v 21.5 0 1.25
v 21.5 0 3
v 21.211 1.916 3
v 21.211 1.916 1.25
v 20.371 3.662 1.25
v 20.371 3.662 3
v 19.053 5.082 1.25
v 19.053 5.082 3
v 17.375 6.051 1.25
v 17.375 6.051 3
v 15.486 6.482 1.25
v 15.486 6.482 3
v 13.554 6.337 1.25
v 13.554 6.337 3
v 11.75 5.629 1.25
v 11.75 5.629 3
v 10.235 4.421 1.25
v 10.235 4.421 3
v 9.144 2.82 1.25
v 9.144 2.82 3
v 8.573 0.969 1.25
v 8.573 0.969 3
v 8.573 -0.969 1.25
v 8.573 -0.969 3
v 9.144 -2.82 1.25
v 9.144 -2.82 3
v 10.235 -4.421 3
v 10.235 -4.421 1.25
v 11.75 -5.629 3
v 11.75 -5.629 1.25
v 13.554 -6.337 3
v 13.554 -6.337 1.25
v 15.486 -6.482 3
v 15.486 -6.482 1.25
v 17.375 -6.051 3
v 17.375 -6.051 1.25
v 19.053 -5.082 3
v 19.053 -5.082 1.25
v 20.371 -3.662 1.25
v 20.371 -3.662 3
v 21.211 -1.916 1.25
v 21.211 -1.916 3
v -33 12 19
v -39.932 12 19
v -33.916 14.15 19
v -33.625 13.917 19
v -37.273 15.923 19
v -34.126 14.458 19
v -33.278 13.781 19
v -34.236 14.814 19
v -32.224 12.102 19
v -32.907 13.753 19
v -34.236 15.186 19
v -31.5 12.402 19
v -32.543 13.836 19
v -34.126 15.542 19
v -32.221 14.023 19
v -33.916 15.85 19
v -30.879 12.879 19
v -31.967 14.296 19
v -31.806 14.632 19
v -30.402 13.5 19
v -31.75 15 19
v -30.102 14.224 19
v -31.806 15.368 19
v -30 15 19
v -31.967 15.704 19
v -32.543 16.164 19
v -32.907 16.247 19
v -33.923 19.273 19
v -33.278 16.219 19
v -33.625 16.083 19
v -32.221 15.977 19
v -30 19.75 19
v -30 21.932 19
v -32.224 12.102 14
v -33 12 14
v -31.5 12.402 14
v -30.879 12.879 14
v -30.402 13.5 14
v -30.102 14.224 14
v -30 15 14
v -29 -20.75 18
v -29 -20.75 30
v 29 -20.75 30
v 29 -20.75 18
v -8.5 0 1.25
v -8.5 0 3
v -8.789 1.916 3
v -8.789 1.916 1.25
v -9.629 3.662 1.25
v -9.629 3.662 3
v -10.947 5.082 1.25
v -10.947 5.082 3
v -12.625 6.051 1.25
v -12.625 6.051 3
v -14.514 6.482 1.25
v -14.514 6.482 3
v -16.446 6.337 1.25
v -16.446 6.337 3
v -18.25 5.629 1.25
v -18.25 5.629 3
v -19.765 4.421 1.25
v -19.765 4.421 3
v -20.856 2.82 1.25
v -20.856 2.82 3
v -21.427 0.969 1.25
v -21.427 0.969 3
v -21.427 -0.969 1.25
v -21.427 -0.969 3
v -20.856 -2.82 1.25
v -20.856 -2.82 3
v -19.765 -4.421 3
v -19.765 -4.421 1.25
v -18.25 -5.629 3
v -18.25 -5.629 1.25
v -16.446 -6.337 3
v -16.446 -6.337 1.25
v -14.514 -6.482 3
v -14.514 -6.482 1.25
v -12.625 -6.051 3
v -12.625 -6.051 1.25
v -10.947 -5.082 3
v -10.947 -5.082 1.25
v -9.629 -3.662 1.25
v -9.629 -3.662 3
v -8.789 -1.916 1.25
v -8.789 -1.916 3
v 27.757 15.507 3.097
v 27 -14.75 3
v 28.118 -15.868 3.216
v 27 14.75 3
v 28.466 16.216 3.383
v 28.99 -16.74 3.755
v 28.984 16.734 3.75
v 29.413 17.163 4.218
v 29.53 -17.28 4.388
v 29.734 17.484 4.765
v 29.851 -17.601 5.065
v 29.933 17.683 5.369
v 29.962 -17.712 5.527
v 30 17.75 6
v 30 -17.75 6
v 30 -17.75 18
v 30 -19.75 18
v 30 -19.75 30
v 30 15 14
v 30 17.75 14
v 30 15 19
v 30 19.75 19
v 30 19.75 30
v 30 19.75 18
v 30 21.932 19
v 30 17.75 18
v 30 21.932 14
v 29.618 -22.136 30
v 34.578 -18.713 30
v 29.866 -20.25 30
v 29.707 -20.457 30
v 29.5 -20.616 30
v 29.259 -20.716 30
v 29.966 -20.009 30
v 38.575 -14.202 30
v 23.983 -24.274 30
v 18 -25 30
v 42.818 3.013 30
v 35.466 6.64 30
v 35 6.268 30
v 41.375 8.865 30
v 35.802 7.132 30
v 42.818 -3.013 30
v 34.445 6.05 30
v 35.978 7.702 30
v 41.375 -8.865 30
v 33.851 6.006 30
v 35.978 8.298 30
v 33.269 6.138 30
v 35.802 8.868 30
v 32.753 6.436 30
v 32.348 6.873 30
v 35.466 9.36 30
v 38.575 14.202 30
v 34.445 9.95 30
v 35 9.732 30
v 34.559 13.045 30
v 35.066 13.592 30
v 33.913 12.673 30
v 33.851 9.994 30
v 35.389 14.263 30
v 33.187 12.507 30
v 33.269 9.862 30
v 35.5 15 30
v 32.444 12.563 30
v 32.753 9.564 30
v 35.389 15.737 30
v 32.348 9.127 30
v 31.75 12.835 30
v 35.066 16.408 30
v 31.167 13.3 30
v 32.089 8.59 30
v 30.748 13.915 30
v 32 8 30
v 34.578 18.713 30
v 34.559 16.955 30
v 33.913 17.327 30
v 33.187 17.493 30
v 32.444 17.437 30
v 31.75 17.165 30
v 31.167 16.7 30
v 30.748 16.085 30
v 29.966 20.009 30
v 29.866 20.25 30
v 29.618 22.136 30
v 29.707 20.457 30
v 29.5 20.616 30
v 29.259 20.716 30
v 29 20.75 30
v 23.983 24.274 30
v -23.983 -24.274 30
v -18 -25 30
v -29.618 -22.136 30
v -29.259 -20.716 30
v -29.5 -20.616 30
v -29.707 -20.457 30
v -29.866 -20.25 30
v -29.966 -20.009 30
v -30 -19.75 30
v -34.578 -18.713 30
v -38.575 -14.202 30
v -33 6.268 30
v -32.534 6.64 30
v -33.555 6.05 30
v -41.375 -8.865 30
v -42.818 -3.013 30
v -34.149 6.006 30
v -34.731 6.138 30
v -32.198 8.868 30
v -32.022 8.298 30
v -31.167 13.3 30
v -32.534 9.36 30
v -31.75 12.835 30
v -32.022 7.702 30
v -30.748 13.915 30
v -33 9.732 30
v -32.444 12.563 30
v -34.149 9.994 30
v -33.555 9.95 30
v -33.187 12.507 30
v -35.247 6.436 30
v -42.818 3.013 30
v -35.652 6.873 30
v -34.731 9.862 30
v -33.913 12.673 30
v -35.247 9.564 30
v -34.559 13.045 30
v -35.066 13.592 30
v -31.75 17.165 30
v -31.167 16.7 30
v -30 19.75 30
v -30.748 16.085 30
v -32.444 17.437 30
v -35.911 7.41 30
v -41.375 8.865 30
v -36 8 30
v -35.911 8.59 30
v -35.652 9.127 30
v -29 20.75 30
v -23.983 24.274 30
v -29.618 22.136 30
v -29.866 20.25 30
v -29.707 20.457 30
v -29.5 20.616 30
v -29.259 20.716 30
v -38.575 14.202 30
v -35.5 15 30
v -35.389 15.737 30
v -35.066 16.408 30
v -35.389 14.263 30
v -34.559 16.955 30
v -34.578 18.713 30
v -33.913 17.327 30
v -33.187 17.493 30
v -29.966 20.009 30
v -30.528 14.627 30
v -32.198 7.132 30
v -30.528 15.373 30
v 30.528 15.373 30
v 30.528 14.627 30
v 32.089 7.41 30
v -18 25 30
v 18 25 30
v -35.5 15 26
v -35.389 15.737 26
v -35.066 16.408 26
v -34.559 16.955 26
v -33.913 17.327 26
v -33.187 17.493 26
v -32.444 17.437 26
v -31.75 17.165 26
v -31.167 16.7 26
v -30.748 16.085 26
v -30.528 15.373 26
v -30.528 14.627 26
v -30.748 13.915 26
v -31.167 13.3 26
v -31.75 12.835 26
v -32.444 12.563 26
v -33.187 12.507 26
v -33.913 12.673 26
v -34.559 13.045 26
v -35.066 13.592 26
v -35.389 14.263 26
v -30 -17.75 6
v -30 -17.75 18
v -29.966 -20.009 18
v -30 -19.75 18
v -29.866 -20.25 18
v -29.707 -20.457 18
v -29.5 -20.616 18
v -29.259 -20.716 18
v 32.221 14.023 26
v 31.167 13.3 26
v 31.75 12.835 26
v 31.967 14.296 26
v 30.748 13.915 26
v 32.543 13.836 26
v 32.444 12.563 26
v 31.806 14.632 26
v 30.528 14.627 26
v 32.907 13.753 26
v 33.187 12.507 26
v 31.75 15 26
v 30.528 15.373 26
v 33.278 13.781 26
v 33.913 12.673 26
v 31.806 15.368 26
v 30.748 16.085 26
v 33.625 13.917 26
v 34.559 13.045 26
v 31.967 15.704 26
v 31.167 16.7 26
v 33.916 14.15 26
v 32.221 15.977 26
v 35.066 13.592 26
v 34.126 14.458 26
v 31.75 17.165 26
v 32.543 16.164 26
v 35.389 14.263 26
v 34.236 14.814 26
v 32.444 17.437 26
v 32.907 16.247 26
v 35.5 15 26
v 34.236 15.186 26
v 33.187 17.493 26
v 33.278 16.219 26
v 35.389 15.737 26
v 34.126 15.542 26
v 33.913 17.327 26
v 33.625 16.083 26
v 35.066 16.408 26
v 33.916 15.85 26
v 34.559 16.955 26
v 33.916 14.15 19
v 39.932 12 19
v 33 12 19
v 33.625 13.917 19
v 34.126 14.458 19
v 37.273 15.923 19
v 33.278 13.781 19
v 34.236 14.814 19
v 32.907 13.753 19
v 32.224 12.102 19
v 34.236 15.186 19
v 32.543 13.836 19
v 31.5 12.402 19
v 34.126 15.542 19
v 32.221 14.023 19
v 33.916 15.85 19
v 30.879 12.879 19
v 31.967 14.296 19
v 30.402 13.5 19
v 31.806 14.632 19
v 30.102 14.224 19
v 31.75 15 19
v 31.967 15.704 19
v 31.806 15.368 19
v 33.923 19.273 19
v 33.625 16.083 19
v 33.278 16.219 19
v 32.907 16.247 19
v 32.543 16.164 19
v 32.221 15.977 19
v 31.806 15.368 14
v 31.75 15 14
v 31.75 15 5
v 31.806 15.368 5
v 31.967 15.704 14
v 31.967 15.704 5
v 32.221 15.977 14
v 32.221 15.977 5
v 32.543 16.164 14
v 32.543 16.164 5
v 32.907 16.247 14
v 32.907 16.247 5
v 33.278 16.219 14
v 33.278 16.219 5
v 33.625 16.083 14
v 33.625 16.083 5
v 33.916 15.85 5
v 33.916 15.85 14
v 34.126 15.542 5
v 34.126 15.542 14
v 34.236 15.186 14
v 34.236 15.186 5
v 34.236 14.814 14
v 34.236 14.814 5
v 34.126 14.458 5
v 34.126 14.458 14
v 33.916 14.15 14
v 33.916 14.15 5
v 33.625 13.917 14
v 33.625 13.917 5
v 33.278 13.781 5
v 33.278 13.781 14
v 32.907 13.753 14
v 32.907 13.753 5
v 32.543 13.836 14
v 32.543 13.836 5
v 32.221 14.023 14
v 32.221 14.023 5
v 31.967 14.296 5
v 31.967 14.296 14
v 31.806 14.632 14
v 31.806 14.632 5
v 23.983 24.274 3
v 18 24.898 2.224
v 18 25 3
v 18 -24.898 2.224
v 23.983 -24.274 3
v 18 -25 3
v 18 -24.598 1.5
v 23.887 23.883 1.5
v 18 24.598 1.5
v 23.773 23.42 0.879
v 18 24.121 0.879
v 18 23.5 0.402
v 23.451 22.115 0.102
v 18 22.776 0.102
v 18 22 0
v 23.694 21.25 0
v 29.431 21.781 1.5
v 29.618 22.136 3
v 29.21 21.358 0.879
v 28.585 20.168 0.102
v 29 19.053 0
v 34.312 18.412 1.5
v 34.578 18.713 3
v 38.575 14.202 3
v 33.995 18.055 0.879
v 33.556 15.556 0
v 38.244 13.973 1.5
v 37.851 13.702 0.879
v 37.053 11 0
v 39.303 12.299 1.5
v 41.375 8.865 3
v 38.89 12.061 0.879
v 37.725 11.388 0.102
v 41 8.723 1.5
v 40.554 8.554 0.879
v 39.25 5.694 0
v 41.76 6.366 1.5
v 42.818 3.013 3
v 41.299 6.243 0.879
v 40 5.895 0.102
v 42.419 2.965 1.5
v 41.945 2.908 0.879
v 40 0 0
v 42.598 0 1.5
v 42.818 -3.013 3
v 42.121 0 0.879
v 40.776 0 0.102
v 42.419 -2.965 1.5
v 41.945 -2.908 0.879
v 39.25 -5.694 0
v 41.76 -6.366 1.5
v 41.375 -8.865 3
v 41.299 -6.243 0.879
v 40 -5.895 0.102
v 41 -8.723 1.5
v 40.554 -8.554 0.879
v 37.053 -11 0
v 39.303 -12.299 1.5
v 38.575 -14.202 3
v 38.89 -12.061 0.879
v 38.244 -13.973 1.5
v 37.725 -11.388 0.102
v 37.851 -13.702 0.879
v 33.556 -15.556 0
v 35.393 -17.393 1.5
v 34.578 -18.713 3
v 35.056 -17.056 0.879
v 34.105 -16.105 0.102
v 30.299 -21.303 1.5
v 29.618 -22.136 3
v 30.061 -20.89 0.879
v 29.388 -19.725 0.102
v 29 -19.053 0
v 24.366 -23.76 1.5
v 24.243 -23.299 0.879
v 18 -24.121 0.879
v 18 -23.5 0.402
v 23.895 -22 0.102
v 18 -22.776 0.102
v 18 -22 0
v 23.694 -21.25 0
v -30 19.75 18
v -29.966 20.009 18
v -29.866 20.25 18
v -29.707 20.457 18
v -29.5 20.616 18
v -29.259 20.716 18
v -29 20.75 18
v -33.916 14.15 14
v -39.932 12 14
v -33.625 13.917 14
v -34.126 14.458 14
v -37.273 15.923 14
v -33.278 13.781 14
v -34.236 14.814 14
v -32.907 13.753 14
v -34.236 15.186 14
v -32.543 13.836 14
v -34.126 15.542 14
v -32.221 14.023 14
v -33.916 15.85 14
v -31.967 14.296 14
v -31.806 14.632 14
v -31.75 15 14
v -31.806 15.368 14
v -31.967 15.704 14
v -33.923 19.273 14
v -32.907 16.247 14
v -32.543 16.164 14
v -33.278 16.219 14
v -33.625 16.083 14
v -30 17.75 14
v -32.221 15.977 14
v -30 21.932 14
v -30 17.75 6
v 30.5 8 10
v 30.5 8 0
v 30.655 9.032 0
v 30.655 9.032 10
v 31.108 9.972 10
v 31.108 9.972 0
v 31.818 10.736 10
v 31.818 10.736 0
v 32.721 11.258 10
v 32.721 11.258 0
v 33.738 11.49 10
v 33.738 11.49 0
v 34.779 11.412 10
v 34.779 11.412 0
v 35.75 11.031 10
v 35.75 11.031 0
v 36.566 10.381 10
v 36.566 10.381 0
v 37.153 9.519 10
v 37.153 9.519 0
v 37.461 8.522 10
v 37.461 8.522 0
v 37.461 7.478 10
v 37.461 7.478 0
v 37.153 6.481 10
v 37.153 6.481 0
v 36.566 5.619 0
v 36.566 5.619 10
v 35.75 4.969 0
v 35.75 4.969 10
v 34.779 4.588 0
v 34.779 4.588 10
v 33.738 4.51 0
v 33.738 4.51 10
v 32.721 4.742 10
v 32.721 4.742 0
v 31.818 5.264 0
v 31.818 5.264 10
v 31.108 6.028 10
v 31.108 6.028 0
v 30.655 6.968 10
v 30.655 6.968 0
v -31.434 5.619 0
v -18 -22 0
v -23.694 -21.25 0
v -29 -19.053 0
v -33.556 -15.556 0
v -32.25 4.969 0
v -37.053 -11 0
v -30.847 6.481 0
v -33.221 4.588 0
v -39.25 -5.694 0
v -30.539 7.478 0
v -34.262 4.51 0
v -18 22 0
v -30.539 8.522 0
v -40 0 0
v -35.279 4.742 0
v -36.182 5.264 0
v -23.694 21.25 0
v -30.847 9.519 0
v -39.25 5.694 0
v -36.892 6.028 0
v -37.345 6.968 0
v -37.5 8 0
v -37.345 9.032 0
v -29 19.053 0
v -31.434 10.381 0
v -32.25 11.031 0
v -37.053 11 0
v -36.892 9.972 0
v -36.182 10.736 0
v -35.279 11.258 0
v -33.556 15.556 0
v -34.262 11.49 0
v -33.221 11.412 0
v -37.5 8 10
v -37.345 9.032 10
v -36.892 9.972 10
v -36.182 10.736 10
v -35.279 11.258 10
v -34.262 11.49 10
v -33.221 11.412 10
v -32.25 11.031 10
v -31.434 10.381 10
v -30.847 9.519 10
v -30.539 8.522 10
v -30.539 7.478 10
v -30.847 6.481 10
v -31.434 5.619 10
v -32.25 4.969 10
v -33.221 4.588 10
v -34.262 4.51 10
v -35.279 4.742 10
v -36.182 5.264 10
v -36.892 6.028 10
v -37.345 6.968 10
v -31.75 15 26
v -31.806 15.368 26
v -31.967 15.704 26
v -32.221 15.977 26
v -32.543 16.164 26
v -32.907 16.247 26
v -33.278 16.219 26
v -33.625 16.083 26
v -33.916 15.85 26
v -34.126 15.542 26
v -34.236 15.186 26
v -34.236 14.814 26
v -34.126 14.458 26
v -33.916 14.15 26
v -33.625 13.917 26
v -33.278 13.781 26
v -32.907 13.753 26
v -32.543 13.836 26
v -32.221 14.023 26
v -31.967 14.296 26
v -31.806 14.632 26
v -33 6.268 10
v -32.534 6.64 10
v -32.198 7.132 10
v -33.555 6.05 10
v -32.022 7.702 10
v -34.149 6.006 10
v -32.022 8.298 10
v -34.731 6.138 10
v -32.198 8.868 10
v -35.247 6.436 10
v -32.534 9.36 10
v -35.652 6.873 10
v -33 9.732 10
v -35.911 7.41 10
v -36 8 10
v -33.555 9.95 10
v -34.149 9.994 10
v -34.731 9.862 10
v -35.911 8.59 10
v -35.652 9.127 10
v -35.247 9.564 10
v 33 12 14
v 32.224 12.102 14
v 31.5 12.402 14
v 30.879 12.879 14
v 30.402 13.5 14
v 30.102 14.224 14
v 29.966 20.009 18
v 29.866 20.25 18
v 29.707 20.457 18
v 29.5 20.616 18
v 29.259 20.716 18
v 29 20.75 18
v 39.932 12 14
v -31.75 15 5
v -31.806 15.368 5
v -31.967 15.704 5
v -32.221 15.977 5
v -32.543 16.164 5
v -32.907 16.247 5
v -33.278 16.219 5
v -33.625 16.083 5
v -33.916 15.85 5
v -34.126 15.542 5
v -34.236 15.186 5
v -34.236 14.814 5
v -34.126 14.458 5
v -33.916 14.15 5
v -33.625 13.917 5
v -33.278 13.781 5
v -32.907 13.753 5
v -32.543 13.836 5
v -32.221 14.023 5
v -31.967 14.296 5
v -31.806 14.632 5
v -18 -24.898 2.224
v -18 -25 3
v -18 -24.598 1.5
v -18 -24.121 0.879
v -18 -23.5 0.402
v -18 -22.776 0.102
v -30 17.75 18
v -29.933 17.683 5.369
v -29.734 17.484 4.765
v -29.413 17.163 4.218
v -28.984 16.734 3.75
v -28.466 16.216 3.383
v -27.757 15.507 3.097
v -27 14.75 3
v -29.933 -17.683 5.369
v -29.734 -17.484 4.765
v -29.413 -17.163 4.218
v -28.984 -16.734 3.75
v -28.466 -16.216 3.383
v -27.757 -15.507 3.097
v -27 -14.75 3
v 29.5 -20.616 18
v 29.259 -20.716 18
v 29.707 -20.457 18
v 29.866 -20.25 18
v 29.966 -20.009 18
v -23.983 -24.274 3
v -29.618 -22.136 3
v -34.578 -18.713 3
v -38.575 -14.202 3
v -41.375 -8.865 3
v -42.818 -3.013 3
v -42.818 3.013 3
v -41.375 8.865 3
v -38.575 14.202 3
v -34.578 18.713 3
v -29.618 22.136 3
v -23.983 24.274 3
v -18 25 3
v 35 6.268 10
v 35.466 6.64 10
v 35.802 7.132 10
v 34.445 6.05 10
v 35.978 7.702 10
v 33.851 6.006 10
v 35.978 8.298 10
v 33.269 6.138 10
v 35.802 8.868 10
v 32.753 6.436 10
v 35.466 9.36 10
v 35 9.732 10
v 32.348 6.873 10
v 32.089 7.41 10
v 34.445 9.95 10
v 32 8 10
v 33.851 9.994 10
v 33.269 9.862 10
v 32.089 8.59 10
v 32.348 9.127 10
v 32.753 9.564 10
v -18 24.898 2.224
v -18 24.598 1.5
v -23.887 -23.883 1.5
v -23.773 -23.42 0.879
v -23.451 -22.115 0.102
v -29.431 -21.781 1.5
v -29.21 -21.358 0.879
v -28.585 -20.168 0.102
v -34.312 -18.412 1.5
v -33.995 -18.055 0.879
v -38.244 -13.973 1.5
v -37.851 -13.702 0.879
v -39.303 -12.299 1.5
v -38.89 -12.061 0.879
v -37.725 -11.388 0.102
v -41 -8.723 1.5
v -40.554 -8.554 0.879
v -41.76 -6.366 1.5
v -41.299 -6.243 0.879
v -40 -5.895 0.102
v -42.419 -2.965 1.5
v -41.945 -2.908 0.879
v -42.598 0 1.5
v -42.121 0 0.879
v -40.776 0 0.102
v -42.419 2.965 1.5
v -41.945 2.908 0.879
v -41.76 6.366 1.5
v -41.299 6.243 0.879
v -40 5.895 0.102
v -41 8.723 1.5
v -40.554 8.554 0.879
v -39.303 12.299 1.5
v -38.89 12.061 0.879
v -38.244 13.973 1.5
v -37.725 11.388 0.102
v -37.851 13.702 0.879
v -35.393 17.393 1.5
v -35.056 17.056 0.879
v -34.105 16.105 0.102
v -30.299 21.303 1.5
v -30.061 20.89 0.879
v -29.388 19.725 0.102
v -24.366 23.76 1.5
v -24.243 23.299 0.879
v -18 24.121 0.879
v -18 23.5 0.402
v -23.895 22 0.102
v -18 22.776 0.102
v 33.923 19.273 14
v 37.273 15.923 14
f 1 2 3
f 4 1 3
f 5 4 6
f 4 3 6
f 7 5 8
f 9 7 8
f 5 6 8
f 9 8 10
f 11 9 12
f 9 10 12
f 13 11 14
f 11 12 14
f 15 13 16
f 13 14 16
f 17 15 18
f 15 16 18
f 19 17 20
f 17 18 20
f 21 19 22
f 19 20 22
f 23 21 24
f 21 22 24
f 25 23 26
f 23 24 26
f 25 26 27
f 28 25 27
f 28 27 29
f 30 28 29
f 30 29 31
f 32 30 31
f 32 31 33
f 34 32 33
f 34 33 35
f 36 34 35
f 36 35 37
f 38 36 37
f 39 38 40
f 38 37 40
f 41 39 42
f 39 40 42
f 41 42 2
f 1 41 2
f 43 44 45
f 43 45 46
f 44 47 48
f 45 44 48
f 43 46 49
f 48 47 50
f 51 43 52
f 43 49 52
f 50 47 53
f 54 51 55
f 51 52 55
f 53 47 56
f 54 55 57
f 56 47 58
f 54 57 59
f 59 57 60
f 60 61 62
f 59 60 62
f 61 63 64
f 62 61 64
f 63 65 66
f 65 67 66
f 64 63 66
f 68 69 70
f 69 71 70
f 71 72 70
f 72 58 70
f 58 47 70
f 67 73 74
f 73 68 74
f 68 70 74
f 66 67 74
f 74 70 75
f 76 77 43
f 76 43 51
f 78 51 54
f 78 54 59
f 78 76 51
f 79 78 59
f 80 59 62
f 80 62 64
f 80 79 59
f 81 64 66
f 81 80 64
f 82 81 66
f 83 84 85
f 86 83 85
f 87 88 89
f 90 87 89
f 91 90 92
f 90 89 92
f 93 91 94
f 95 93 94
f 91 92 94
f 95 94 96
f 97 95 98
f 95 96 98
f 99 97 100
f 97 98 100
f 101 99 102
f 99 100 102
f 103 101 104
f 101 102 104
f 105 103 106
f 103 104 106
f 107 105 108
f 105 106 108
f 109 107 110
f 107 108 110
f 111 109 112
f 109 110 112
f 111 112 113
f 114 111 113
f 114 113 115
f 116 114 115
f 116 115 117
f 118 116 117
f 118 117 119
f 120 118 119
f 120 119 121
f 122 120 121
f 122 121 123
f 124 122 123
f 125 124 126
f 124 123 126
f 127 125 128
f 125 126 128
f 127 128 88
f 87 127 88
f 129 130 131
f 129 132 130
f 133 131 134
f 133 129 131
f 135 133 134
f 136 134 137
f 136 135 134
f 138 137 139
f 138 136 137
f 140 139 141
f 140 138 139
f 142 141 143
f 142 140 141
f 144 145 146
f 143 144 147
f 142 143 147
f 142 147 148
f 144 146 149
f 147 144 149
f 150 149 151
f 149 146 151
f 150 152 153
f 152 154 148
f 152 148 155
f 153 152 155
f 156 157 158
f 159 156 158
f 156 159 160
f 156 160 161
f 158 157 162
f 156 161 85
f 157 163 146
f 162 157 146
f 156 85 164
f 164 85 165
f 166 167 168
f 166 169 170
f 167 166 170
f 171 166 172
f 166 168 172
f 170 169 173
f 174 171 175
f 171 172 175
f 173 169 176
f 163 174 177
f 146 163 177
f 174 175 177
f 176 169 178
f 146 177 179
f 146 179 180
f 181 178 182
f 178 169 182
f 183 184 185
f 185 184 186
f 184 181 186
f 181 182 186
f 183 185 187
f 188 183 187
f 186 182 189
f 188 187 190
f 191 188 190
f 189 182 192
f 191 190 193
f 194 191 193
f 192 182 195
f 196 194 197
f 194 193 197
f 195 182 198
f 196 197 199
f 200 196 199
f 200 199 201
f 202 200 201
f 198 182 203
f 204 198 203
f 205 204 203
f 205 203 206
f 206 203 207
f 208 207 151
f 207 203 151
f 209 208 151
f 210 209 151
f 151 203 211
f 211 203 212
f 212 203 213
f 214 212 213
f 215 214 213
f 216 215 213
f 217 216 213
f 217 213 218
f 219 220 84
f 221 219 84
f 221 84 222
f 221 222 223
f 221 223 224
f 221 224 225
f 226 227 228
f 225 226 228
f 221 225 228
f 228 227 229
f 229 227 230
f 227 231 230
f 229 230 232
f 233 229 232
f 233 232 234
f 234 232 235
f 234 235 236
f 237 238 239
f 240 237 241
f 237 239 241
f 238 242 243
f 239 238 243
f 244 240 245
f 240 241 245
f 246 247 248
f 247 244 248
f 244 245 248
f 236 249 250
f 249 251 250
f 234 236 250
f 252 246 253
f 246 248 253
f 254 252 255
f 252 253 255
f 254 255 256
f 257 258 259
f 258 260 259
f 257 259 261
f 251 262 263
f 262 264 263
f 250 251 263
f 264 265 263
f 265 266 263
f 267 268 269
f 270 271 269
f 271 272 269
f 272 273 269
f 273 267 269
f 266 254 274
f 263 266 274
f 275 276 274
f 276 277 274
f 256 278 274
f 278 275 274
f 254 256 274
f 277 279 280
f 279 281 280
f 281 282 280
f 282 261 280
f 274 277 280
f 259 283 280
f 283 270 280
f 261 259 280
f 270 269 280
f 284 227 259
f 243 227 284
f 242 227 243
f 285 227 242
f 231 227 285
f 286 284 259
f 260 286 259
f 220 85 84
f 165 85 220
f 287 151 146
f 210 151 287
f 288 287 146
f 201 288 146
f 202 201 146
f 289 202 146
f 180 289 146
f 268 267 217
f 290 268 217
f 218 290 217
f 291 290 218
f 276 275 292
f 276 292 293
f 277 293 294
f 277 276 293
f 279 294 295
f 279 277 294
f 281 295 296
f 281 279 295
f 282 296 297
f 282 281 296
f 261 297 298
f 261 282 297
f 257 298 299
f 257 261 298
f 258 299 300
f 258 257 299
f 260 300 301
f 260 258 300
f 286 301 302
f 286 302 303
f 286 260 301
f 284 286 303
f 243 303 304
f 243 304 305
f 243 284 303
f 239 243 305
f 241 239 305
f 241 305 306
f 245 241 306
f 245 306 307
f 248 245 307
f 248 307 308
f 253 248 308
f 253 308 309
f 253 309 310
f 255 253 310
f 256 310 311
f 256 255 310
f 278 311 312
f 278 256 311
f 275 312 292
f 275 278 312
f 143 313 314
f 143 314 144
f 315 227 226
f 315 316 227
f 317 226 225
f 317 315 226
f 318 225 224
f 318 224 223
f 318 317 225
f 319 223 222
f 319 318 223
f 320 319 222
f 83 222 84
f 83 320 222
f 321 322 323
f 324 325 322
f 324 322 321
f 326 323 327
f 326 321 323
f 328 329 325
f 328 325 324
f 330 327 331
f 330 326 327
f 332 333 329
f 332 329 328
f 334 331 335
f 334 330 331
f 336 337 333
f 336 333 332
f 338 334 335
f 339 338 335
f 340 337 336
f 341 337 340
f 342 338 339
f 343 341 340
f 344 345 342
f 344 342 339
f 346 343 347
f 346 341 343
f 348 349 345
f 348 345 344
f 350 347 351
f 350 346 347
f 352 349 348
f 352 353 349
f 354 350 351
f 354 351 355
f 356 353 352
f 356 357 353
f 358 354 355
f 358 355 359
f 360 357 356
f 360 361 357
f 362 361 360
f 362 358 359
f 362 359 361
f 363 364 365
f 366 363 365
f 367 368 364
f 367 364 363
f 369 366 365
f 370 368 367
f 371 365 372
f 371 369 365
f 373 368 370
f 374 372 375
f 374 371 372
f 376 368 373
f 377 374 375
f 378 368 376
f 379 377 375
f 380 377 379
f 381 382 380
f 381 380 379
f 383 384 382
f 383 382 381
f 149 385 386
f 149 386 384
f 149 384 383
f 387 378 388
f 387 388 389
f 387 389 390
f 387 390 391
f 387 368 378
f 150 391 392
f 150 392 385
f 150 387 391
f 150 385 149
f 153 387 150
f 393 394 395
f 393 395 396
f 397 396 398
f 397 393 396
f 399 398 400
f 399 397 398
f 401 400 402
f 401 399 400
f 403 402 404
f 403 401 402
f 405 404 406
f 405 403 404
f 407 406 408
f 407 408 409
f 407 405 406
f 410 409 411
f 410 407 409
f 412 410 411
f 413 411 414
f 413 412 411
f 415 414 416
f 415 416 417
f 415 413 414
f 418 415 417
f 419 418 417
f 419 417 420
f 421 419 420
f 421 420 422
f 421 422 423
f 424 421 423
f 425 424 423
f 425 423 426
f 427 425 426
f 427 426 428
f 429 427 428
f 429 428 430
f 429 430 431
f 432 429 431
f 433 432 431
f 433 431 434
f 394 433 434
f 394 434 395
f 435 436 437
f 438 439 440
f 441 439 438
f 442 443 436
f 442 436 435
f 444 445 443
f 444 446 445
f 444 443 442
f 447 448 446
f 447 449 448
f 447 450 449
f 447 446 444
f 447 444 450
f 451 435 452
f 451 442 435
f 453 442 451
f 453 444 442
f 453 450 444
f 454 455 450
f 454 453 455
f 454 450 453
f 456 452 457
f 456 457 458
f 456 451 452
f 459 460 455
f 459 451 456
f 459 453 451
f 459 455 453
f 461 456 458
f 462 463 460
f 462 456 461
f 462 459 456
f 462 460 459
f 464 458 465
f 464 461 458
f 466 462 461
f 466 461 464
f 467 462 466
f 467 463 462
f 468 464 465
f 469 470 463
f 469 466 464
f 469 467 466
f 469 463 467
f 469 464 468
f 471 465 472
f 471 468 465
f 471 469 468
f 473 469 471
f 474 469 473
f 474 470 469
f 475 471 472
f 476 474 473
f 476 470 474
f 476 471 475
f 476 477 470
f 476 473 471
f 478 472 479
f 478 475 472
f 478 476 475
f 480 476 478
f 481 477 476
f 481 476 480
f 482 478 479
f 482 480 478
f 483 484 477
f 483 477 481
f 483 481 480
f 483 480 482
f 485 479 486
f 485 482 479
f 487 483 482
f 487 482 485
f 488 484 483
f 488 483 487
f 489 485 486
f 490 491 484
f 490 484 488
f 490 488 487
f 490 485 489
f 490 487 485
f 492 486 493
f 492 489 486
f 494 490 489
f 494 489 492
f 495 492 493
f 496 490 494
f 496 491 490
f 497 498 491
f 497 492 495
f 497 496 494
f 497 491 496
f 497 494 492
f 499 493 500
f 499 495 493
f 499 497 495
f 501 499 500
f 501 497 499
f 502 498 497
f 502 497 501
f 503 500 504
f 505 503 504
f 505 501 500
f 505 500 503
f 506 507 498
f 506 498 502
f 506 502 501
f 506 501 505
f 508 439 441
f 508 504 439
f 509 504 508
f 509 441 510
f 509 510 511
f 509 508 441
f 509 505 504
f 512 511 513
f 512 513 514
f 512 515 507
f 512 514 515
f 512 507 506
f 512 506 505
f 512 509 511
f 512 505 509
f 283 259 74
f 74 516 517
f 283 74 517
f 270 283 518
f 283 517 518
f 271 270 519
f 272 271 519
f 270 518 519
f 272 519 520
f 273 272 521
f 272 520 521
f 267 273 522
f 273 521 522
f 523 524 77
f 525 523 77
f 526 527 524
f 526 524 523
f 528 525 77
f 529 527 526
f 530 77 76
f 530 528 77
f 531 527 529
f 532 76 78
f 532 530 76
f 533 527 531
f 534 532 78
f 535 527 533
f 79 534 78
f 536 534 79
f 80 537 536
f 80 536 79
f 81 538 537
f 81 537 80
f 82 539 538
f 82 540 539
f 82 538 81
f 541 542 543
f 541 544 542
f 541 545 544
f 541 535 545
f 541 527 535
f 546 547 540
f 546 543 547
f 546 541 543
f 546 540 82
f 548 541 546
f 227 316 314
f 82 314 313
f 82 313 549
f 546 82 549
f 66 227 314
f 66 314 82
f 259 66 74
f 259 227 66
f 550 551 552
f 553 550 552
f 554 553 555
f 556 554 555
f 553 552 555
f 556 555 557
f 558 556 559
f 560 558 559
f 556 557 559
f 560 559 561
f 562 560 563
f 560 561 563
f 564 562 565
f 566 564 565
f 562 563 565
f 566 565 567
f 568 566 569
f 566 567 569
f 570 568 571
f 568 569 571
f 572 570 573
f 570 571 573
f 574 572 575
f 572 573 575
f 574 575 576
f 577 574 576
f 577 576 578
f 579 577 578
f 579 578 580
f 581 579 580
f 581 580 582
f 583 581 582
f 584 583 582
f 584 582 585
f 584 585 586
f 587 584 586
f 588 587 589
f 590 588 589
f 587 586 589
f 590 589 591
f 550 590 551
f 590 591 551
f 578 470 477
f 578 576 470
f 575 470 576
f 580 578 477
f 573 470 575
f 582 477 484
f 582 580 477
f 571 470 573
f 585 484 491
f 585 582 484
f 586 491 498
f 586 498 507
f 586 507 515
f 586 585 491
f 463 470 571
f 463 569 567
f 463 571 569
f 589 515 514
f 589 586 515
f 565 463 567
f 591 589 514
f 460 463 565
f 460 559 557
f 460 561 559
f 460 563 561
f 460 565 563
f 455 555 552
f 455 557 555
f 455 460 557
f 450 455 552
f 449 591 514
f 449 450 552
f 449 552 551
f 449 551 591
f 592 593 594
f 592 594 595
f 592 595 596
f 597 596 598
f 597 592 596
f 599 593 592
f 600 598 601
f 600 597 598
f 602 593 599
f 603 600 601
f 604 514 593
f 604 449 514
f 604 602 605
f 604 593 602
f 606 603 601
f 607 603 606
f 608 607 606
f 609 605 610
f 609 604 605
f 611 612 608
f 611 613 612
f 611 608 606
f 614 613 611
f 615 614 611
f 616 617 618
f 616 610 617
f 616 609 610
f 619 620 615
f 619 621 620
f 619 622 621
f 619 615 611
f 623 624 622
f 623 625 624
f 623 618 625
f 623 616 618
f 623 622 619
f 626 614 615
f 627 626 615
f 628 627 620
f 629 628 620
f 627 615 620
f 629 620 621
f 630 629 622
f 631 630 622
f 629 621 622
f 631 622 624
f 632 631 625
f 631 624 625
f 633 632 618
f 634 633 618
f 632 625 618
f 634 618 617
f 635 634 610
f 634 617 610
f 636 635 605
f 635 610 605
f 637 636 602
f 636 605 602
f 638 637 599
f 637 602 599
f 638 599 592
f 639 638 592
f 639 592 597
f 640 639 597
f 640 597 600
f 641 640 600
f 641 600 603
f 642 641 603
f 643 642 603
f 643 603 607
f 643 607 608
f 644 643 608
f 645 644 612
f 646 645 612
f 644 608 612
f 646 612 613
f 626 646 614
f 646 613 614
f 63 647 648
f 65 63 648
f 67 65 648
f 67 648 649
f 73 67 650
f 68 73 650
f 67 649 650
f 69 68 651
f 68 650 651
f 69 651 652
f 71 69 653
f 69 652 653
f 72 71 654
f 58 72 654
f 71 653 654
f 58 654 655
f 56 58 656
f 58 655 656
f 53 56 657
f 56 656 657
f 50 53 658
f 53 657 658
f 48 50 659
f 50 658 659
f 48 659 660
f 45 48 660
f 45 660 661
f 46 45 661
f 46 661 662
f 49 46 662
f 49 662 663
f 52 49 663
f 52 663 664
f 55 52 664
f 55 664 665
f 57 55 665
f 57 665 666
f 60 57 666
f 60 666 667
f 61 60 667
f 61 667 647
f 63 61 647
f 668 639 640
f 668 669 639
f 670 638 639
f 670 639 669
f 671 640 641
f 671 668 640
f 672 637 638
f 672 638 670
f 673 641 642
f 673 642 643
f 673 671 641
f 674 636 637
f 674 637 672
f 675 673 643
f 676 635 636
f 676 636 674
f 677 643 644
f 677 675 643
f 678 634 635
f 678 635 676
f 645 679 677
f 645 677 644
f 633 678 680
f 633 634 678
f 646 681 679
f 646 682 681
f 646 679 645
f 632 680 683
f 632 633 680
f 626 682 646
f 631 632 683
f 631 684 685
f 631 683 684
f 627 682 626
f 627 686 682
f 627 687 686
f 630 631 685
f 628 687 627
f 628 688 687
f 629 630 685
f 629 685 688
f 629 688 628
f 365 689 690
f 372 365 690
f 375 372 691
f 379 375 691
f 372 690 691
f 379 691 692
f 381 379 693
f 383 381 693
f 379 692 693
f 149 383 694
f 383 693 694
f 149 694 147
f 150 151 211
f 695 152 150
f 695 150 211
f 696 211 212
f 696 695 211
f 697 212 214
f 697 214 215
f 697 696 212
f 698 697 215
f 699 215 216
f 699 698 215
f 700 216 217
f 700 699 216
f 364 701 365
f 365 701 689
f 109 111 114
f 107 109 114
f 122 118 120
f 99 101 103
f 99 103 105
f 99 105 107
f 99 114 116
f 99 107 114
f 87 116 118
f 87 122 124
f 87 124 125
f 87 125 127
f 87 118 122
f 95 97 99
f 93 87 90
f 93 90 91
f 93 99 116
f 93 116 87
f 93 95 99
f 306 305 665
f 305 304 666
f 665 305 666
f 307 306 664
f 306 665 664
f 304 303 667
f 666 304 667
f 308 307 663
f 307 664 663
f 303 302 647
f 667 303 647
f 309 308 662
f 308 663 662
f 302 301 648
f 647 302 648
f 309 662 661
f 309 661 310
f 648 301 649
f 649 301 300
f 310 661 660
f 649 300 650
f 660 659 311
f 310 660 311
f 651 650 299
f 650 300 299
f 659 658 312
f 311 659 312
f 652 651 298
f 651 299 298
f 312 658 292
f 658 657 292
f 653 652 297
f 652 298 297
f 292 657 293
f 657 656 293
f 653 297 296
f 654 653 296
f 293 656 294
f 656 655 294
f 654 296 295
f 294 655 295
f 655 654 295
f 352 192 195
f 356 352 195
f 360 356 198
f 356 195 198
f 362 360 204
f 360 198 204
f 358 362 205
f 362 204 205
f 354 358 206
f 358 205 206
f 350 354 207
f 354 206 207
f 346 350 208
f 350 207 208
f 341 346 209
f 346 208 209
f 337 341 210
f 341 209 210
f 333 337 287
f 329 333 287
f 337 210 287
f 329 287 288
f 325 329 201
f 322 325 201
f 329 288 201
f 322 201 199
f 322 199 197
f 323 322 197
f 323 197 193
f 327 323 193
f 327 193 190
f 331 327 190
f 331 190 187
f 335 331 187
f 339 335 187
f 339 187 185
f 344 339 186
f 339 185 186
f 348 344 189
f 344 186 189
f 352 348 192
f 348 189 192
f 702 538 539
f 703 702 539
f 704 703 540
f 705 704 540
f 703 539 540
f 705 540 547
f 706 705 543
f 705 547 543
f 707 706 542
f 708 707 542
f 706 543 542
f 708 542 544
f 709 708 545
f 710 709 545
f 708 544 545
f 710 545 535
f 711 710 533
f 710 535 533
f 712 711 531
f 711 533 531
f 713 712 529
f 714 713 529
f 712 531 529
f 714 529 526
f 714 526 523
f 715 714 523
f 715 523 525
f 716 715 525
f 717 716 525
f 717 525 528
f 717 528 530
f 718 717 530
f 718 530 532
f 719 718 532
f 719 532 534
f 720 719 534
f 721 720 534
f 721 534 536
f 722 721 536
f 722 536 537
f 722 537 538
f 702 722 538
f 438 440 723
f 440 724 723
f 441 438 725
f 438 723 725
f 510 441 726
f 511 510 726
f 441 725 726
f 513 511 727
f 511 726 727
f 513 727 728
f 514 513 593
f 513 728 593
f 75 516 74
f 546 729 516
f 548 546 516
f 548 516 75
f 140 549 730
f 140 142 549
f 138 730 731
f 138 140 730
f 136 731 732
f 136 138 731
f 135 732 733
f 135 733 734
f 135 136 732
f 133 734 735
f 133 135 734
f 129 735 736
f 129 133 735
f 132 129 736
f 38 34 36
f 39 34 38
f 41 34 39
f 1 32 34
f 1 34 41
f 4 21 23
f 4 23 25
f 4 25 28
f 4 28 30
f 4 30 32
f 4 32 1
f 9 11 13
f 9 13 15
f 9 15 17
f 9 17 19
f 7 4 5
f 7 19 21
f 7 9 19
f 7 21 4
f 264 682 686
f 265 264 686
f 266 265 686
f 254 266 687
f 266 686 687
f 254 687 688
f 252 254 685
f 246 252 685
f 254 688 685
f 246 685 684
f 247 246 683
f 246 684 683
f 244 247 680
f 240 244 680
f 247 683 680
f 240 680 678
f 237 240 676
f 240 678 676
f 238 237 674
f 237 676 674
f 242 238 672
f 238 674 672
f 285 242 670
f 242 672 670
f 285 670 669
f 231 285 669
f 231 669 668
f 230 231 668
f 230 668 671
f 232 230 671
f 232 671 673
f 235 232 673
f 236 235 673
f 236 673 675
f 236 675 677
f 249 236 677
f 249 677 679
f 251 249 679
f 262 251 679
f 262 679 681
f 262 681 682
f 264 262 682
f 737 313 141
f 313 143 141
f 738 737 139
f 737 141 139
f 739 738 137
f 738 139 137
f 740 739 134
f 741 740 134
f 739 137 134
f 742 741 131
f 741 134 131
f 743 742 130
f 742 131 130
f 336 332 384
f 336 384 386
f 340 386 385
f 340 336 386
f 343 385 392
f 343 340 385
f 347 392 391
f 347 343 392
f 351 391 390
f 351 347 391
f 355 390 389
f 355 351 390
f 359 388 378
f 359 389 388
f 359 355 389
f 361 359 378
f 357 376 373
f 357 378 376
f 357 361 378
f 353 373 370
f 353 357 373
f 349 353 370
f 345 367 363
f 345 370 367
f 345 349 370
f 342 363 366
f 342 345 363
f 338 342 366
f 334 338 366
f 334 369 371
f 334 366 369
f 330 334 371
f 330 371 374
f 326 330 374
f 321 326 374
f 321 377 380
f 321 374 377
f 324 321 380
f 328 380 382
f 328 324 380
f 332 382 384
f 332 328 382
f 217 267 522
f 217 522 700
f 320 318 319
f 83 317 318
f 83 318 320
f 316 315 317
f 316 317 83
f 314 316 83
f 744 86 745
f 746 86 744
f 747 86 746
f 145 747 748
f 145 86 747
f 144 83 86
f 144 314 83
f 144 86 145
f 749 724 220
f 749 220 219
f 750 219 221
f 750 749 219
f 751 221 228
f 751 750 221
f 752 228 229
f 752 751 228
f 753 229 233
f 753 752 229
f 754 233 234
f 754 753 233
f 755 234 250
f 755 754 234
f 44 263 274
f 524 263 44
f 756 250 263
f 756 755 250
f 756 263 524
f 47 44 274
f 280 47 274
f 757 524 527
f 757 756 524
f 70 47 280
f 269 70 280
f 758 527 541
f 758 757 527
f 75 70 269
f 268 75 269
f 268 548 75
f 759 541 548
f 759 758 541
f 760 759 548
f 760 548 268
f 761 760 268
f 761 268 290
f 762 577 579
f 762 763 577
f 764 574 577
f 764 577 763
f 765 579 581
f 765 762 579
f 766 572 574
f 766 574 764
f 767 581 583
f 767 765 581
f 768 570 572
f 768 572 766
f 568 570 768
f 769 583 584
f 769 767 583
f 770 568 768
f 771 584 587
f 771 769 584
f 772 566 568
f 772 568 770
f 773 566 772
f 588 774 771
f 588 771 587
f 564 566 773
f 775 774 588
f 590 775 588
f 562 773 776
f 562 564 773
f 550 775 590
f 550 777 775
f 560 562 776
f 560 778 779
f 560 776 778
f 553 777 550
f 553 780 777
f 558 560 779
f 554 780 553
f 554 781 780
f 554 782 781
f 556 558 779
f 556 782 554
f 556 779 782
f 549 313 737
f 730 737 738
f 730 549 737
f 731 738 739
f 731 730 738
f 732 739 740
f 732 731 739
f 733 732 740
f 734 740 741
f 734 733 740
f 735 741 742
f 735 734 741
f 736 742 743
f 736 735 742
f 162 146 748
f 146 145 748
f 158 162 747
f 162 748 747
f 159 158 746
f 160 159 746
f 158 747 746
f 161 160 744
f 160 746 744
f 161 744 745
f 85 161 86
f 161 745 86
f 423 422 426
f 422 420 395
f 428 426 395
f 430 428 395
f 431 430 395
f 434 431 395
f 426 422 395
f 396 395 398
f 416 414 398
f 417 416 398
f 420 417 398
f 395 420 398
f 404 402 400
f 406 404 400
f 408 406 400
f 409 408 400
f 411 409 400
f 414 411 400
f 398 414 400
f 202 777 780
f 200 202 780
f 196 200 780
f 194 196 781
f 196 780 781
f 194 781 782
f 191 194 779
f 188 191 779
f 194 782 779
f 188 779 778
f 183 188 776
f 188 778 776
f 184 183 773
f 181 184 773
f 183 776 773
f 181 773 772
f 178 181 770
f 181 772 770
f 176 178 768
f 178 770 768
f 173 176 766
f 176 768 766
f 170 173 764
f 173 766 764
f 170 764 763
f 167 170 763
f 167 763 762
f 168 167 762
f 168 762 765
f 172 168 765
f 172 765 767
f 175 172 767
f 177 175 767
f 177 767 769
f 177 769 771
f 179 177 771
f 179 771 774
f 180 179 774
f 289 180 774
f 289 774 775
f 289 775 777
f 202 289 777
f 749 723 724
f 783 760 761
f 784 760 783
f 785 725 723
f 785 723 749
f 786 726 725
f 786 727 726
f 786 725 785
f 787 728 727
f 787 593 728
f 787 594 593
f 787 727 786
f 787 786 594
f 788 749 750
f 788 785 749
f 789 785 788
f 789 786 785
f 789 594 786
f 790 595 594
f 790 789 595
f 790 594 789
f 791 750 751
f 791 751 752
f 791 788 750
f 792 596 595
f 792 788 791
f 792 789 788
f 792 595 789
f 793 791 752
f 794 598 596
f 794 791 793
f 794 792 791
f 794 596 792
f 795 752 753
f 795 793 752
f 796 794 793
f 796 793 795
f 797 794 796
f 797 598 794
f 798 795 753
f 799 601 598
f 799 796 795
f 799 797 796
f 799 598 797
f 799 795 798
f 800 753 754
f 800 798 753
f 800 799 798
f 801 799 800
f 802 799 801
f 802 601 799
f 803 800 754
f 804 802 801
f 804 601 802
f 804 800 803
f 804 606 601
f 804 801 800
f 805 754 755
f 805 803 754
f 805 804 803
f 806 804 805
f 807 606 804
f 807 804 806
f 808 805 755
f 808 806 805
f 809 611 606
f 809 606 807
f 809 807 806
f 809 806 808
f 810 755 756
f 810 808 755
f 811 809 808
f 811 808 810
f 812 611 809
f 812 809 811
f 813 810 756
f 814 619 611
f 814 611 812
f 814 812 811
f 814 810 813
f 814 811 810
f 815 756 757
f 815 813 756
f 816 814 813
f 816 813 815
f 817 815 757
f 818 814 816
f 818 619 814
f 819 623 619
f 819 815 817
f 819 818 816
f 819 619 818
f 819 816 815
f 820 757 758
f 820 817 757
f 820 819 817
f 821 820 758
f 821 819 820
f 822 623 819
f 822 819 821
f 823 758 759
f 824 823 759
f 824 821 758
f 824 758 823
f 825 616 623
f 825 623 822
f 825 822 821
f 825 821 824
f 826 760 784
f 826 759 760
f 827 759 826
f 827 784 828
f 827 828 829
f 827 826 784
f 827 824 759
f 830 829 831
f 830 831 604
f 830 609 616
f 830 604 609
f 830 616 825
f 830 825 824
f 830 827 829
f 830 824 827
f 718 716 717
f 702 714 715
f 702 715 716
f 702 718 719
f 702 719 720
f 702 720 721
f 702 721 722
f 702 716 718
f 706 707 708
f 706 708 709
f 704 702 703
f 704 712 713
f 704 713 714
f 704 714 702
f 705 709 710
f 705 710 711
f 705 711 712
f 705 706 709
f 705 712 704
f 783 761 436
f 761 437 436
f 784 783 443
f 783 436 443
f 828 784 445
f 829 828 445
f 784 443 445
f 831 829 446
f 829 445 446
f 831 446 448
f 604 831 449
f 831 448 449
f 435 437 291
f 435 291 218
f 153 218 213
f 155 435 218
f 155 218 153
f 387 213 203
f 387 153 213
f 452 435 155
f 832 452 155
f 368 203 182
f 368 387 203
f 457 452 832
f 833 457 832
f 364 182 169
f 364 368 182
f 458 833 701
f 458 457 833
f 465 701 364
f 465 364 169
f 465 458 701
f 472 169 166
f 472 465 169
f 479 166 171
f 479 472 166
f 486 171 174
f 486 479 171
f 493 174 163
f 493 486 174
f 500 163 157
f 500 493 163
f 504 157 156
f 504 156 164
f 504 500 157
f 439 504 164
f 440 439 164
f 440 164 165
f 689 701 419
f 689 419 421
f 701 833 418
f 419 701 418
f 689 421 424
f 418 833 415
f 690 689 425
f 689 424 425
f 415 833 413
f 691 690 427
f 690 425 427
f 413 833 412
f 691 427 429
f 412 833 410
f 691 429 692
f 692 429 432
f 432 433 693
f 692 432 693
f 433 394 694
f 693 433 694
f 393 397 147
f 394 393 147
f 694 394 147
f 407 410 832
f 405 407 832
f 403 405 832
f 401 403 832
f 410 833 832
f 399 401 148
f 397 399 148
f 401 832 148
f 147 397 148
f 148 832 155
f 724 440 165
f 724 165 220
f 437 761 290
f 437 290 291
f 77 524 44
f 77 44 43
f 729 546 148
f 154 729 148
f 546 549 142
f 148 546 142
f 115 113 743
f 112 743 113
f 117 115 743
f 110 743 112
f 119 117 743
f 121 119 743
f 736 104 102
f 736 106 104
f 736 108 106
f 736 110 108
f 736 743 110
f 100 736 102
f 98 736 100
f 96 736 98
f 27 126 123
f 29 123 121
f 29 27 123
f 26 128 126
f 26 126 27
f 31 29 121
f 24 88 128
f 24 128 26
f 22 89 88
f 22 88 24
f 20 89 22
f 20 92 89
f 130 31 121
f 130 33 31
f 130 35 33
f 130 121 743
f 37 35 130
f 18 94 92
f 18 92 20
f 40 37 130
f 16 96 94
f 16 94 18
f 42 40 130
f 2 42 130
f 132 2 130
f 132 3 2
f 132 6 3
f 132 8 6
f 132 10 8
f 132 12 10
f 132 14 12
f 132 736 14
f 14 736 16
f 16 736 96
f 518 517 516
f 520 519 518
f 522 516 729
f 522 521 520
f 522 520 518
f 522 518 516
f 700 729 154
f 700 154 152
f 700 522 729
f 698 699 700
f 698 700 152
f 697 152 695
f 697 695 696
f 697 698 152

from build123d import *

# Parameters (mm, degrees)
BOSS_EXTRUDE1_DEPTH = 30
SKETCH2_W           = 60
SKETCH2_H           = 41.5
CUT_EXTRUDE1_DEPTH  = 27
SKETCH5_W           = 60
SKETCH5_H           = 3
BOSS_EXTRUDE2_DEPTH = 15
FILLET2_R           = 1
FILLET3_R           = 3
FILLET4_R           = 3
CUT_EXTRUDE2_START  = 14
CUT_EXTRUDE2_DEPTH  = 5
CUT_EXTRUDE3_START  = -30
SKETCH7_R           = 1.25
CUT_EXTRUDE3_DEPTH  = 25
SKETCH8_R           = 2.5
CUT_EXTRUDE4_DEPTH  = 4
SKETCH9_R           = 6.5
CUT_EXTRUDE5_DEPTH  = 1.75
SKETCH10_R          = 2
CUT_EXTRUDE6_DEPTH  = 31
SKETCH11_R          = 3.5
CUT_EXTRUDE7_DEPTH  = 10


with BuildPart() as part:
    # Sketch1 → Boss-Extrude1 (new body)
    with BuildSketch(Plane.XY):
        with BuildLine():
            Line((-18, 25), (18, 25))
            ThreePointArc((18, 25), (43, 0), (18, -25))
            Line((18, -25), (-18, -25))
            ThreePointArc((-18, -25), (-43, 0), (-18, 25))
        make_face()
    extrude(amount=BOSS_EXTRUDE1_DEPTH)

    # Sketch2 → Cut-Extrude1 (cut)
    with BuildSketch(Plane.XY.offset(30)):
        Rectangle(SKETCH2_W, SKETCH2_H)
    extrude(amount=-CUT_EXTRUDE1_DEPTH, mode=Mode.SUBTRACT)

    # Sketch5 → Boss-Extrude2 (add)
    with BuildSketch(Plane.XY.offset(3)):
        with Locations((0, 19.25)):
            Rectangle(SKETCH5_W, SKETCH5_H)
        with Locations((0, -19.25)):
            Rectangle(SKETCH5_W, SKETCH5_H)
    extrude(amount=BOSS_EXTRUDE2_DEPTH)

    # Fillet2
    fillet2_edges = [part.edges().sort_by_distance(p)[0] for p in [
        (-30, 20.75, 24),
        (30, 20.75, 24),
        (30, -20.75, 24),
        (-30, -20.75, 24),
    ]]
    fillet(fillet2_edges, radius=FILLET2_R)

    # Fillet3
    fillet3_edges = [part.edges().sort_by_distance(p)[0] for p in [
        (-30, 0, 3),
        (0, 17.75, 3),
        (30, 0, 3),
        (0, -17.75, 3),
    ]]
    fillet(fillet3_edges, radius=FILLET3_R)

    # Fillet4
    fillet4_edges = [part.edges().sort_by_distance(p)[0] for p in [
        (0, 25, 0),
        (43, 0, 0),
        (0, -25, 0),
        (-43, 0, 0),
    ]]
    fillet(fillet4_edges, radius=FILLET4_R)

    # Sketch6 → Cut-Extrude2 (cut)
    with BuildSketch(Plane.XY.offset(CUT_EXTRUDE2_START)):
        with BuildLine():
            Line((-44.296401613, 12), (-33, 12))
            ThreePointArc((-33, 12), (-30.878679656, 12.878679656), (-30, 15))
            Line((-30, 15), (-30, 24.104241325))
            Line((-30, 24.104241325), (-44.296401613, 12))
        make_face()
        with BuildLine():
            Line((30, 24.104241325), (44.296401613, 12))
            Line((44.296401613, 12), (33, 12))
            ThreePointArc((33, 12), (30.878679656, 12.878679656), (30, 15))
            Line((30, 15), (30, 24.104241325))
        make_face()
    extrude(amount=CUT_EXTRUDE2_DEPTH, mode=Mode.SUBTRACT)

    # Sketch7 → Cut-Extrude3 (cut)
    with BuildSketch(Plane(origin=(0, 0, 0), x_dir=(-1, 0, 0), z_dir=(0, 0, -1)).offset(CUT_EXTRUDE3_START)):
        with Locations((-33, 15)):
            Circle(SKETCH7_R)
    cut_extrude3 = extrude(amount=CUT_EXTRUDE3_DEPTH, mode=Mode.SUBTRACT)

    # Sketch8 → Cut-Extrude4 (cut)
    with BuildSketch(Plane.XY.offset(30)):
        with Locations((33, 15)):
            Circle(SKETCH8_R)
    cut_extrude4 = extrude(amount=-CUT_EXTRUDE4_DEPTH, mode=Mode.SUBTRACT)

    # Mirror1: Cut-Extrude3, Cut-Extrude4 across plane
    add(cut_extrude3.mirror(Plane(origin=(0, 0, 0), x_dir=(0, 0, 1), z_dir=(1, 0, 0))), mode=Mode.SUBTRACT)
    add(cut_extrude4.mirror(Plane(origin=(0, 0, 0), x_dir=(0, 0, 1), z_dir=(1, 0, 0))), mode=Mode.SUBTRACT)

    # Sketch9 → Cut-Extrude5 (cut)
    with BuildSketch(Plane.XY.offset(3)):
        with Locations((-15, 0)):
            Circle(SKETCH9_R)
        with Locations((15, 0)):
            Circle(SKETCH9_R)
    extrude(amount=-CUT_EXTRUDE5_DEPTH, mode=Mode.SUBTRACT)

    # Sketch10 → Cut-Extrude6 (cut, through all)
    with BuildSketch(Plane(origin=(0, 0, 0), x_dir=(-1, 0, 0), z_dir=(0, 0, -1))):
        with Locations((-34, 8)):
            Circle(SKETCH10_R)
        with Locations((34, 8)):
            Circle(SKETCH10_R)
    extrude(amount=-CUT_EXTRUDE6_DEPTH, mode=Mode.SUBTRACT)

    # Sketch11 → Cut-Extrude7 (cut)
    with BuildSketch(Plane(origin=(0, 0, 0), x_dir=(-1, 0, 0), z_dir=(0, 0, -1))):
        with Locations((-34, 8)):
            Circle(SKETCH11_R)
        with Locations((34, 8)):
            Circle(SKETCH11_R)
    extrude(amount=-CUT_EXTRUDE7_DEPTH, mode=Mode.SUBTRACT)


solid = part.part
